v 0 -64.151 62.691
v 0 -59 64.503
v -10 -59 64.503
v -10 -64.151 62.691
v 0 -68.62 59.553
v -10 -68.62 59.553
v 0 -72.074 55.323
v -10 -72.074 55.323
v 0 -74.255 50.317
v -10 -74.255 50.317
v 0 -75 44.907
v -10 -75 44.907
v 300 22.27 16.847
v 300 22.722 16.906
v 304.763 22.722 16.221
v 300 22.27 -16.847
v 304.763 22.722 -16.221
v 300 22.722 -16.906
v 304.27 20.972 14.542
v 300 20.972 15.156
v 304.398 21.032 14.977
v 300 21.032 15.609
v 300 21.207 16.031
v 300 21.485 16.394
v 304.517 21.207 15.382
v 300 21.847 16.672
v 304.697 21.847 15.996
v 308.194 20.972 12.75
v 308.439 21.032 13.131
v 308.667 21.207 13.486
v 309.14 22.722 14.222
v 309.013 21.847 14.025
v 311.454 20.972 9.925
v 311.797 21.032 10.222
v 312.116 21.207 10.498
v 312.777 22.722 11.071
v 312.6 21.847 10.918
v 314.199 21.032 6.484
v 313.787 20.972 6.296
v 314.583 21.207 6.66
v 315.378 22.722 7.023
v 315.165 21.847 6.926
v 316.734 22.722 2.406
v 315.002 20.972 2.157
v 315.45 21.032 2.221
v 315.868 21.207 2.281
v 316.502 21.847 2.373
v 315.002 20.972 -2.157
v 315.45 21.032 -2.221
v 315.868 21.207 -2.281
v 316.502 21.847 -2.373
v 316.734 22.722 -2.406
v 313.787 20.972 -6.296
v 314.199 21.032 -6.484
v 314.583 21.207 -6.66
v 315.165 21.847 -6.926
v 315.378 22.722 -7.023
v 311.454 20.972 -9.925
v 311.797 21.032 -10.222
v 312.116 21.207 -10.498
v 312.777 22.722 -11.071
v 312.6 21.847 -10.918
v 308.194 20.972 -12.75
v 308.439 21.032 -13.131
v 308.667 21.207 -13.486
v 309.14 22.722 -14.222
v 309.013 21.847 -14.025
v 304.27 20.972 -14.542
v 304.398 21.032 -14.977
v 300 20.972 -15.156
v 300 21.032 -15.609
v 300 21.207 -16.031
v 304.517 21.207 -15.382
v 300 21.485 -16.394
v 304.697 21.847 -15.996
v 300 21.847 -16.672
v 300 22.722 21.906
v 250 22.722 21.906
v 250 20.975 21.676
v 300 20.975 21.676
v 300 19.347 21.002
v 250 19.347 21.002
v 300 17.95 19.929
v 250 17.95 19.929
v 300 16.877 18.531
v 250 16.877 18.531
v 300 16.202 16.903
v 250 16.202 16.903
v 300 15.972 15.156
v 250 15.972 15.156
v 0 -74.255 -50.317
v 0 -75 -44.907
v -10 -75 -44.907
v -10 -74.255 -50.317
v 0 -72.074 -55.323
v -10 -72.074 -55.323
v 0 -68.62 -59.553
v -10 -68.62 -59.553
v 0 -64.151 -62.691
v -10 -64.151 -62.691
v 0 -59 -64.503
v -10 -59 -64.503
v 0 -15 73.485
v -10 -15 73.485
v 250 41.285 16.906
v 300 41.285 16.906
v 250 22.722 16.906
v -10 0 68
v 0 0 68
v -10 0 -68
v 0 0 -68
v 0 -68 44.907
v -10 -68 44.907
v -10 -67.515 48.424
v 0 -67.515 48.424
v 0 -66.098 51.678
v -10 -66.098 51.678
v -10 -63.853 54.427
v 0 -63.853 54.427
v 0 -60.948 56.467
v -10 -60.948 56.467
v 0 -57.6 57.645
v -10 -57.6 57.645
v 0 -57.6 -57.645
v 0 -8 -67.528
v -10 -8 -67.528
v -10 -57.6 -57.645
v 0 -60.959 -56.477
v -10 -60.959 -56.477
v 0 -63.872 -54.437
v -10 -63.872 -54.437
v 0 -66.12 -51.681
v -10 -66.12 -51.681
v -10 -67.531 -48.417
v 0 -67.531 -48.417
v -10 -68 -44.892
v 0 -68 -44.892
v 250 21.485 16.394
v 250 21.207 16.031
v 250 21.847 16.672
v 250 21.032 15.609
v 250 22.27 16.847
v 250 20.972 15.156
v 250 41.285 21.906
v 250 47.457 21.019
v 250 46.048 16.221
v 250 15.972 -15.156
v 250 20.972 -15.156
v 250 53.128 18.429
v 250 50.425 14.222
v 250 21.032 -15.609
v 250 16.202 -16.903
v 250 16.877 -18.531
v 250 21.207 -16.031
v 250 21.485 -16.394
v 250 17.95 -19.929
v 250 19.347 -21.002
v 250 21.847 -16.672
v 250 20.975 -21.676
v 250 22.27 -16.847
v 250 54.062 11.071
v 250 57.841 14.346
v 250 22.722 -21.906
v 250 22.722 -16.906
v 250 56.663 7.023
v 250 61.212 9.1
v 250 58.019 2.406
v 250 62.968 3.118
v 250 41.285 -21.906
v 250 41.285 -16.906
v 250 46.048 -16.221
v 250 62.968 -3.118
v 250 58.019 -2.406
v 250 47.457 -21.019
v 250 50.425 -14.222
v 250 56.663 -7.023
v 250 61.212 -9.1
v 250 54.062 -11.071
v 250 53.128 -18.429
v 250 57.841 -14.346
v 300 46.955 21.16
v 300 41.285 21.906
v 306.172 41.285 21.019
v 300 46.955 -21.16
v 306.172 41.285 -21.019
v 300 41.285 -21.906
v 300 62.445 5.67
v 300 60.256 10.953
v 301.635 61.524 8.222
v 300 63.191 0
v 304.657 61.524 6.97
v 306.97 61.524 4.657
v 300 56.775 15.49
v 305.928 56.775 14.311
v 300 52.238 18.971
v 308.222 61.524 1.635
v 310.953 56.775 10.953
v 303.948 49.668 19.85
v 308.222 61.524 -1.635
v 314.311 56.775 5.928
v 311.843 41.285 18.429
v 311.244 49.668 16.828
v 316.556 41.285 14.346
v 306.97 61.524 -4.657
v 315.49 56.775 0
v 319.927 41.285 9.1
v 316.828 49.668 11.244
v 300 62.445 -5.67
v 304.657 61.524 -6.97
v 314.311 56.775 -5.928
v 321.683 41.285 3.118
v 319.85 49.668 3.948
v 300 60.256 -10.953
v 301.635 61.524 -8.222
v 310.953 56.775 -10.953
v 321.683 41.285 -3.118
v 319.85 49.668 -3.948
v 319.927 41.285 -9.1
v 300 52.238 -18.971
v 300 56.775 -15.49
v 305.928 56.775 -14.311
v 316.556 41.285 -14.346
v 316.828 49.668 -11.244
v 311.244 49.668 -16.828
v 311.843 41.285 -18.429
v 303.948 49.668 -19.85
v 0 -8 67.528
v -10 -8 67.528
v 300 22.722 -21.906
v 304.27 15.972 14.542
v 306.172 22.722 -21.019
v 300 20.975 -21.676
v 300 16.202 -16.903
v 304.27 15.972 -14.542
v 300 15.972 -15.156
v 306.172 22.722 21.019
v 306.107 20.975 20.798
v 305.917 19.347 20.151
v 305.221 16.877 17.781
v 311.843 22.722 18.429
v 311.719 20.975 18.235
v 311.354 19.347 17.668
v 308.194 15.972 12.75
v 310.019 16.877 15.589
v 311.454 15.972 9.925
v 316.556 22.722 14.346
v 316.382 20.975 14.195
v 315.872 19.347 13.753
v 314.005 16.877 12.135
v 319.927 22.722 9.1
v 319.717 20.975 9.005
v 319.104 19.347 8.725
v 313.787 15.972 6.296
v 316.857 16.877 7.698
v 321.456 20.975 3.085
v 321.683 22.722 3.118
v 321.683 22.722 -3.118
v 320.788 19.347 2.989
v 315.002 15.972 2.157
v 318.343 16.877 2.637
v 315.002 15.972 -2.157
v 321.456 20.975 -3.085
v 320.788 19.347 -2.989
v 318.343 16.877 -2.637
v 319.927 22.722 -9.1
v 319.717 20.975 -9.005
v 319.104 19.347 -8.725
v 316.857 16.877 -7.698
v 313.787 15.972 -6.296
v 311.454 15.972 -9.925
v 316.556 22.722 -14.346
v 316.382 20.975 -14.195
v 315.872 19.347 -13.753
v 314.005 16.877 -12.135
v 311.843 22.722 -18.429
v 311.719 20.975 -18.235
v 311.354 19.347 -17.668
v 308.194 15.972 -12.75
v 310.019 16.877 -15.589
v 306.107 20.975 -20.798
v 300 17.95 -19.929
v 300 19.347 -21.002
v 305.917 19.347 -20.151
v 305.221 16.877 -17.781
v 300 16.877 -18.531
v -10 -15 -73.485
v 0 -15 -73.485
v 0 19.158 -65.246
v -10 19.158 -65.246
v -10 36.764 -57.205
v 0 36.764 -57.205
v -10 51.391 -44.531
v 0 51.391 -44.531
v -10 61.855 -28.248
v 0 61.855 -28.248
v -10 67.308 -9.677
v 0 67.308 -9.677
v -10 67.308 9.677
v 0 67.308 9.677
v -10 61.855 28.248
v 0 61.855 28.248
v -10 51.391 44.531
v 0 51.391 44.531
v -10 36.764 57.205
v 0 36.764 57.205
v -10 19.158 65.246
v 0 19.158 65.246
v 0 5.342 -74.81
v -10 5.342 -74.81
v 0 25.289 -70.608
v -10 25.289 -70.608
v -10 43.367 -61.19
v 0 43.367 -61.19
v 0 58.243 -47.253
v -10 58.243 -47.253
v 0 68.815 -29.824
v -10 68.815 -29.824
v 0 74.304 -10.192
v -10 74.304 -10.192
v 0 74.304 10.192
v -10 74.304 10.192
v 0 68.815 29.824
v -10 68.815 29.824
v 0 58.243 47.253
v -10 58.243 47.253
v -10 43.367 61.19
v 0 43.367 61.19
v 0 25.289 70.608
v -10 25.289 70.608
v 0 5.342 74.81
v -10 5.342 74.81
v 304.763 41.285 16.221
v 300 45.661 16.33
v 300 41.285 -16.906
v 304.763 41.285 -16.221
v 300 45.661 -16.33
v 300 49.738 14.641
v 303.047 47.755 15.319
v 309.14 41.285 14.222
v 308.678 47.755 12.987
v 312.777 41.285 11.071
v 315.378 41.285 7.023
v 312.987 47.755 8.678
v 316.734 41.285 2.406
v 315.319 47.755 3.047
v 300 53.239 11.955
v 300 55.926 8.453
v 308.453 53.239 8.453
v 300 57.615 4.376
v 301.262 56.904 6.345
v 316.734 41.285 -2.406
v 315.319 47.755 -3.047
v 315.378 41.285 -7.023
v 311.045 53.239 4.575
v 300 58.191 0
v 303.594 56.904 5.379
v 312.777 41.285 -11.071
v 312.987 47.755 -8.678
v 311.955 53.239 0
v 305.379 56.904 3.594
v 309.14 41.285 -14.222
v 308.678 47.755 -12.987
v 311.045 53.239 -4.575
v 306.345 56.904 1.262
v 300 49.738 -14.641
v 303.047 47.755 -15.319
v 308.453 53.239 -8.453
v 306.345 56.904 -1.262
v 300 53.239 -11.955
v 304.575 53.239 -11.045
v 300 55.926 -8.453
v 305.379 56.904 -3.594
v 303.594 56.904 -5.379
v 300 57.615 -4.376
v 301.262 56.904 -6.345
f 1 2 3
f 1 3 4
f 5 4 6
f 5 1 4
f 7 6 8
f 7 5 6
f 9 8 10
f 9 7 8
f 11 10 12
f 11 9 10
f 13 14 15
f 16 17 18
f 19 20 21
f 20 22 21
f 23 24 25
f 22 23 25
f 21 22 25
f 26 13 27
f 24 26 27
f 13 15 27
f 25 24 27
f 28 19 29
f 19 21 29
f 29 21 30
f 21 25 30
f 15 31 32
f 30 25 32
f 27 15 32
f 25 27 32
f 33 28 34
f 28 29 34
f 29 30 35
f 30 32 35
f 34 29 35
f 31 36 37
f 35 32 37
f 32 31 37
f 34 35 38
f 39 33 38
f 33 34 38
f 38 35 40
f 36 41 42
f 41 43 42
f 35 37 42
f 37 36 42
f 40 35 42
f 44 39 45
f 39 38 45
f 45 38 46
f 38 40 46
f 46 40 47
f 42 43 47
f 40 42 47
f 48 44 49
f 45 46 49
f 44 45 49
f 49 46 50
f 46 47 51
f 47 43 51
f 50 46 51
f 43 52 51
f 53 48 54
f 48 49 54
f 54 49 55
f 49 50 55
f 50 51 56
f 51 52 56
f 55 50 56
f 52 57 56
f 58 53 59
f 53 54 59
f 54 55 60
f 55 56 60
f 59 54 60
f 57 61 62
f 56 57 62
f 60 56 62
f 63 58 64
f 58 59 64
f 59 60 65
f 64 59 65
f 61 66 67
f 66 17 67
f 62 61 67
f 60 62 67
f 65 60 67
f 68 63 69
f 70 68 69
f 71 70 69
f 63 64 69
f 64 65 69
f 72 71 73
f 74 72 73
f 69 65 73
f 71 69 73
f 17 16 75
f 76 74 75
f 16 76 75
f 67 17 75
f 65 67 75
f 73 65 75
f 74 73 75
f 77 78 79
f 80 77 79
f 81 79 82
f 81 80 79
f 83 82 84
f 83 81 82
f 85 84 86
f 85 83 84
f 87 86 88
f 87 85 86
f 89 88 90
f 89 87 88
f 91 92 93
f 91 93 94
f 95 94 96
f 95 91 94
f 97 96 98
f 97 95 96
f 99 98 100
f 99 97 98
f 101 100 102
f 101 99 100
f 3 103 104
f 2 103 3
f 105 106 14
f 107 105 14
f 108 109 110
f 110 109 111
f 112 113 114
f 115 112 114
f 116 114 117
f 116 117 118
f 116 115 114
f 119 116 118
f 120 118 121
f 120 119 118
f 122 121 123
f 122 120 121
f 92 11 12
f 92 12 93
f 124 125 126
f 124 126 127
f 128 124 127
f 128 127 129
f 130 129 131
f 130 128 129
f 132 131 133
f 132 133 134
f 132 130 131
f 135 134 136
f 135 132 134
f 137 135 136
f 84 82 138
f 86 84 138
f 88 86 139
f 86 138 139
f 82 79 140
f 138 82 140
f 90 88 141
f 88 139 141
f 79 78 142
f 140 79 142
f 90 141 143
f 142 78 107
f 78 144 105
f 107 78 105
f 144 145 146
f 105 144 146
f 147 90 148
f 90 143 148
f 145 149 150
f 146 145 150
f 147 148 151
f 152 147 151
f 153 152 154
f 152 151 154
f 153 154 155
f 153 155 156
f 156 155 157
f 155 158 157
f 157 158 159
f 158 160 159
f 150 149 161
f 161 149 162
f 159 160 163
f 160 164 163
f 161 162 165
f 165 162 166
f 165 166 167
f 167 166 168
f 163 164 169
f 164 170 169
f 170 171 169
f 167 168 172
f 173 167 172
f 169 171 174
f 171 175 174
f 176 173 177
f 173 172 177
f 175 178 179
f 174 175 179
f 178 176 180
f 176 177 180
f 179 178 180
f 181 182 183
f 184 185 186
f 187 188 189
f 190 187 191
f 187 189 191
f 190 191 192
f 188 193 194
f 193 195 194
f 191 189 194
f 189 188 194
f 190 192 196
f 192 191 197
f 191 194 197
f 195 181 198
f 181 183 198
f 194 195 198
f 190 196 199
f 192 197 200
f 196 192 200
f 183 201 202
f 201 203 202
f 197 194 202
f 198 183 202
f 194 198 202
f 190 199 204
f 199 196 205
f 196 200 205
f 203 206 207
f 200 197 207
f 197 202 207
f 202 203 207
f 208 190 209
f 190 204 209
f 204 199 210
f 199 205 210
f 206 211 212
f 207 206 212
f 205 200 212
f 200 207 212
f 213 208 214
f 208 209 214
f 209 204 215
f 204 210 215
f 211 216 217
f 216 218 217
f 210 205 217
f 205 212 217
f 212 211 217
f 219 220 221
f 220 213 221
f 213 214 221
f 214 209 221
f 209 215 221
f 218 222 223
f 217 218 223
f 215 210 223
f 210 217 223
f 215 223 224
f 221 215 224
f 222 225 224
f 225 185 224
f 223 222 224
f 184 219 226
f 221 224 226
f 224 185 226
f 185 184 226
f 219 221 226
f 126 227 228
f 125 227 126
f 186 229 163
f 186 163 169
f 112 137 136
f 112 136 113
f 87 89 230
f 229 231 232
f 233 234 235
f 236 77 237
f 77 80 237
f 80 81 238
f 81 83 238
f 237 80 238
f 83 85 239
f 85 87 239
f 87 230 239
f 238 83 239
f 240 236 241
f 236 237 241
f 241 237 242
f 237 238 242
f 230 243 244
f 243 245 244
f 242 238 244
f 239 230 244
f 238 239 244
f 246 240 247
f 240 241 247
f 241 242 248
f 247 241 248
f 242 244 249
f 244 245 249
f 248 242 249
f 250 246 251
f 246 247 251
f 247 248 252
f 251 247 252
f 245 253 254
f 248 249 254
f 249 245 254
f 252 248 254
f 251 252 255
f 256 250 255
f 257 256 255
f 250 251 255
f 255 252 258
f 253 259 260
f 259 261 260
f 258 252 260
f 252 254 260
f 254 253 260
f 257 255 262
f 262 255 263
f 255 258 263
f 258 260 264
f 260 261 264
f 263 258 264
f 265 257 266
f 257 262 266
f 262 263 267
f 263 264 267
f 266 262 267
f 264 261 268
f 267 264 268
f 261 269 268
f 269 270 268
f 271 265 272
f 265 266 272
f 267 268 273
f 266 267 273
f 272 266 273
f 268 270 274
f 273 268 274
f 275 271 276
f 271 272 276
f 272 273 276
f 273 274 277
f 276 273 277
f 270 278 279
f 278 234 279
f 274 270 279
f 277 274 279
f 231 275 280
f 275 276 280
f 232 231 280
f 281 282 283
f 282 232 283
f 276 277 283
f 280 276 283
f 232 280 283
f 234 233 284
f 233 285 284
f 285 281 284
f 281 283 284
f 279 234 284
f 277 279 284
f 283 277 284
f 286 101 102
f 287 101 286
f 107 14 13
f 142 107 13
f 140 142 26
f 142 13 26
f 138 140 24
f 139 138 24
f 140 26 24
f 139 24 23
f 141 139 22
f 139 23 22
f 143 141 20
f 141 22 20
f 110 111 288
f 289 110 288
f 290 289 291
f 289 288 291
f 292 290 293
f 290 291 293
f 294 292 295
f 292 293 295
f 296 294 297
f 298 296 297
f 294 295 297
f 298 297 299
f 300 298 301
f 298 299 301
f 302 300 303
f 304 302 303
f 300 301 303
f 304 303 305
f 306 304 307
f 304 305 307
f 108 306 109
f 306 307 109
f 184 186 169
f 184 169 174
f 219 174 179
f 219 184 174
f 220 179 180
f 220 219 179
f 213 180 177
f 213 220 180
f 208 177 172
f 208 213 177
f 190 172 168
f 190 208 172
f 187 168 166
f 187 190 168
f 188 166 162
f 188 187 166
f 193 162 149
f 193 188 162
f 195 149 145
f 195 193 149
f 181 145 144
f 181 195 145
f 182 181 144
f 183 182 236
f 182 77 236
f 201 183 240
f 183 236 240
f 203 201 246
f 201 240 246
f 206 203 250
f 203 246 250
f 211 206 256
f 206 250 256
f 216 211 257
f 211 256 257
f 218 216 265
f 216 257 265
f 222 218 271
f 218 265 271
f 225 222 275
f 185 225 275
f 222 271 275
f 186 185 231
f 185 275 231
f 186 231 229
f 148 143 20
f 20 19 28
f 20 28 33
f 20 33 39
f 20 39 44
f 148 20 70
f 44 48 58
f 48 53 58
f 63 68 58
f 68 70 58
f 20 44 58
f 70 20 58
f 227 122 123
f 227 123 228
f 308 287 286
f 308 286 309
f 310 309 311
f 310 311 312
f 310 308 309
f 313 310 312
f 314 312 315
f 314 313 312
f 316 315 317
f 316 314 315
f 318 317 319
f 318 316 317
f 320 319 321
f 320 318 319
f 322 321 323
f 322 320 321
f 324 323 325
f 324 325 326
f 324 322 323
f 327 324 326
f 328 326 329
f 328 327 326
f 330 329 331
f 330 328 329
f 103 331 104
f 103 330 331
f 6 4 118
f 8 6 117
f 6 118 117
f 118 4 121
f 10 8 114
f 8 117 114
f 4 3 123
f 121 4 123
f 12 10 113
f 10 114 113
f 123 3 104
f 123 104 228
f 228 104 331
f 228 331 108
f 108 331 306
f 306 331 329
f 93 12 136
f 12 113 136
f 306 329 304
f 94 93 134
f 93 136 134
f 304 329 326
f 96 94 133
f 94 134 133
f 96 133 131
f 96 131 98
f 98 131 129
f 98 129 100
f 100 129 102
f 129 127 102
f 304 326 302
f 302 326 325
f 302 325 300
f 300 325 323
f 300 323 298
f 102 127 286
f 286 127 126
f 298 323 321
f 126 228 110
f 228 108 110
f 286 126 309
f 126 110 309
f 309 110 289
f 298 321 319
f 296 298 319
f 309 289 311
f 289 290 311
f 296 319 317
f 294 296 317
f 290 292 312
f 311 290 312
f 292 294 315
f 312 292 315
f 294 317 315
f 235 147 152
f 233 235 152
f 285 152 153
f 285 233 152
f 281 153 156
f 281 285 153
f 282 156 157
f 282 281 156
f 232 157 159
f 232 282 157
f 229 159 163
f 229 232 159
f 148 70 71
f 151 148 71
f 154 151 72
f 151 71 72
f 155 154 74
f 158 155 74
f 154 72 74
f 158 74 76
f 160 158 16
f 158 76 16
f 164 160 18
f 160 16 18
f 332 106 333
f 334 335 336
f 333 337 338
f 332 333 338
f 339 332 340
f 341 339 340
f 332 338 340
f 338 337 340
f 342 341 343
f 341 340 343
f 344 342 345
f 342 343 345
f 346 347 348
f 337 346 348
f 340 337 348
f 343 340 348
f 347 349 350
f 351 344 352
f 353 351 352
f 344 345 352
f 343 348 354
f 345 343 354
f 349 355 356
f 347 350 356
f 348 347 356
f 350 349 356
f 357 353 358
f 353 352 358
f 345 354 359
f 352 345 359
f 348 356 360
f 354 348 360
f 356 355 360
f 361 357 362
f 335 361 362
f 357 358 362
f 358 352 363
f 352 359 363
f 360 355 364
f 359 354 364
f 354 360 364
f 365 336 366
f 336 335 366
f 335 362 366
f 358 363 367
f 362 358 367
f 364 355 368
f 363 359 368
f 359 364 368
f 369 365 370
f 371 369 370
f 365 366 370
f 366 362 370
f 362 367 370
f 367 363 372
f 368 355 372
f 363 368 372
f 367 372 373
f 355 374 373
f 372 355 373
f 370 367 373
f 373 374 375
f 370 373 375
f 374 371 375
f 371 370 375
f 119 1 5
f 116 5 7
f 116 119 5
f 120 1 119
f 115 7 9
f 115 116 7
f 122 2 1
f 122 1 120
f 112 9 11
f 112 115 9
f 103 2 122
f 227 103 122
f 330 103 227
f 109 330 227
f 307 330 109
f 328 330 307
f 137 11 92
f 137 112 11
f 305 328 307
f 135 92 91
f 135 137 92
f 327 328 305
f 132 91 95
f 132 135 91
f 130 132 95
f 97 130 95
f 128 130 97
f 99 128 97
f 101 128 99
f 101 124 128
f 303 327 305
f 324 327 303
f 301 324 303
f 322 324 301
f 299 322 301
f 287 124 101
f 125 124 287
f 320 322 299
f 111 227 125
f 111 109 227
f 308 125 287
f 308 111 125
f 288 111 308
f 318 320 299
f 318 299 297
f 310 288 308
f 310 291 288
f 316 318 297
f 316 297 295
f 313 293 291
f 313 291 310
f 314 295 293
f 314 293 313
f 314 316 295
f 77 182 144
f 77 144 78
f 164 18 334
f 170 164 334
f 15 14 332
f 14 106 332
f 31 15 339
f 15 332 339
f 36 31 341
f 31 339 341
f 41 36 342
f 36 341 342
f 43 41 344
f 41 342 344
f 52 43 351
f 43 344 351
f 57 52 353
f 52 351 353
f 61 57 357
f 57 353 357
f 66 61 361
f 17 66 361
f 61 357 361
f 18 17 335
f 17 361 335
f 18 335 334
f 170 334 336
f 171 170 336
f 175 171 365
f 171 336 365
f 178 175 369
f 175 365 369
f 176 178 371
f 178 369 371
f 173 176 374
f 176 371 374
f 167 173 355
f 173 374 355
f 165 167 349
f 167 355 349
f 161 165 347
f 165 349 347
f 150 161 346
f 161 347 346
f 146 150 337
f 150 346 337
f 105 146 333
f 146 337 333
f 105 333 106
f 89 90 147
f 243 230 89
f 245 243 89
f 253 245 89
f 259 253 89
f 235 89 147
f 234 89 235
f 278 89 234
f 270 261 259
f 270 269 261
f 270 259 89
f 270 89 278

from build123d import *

# Parameters (mm, degrees)
BOSS_EXTRUDE1_DEPTH = 10
BOSS_EXTRUDE2_DEPTH = 50
REVOLVE1_ANGLE      = 180


with BuildPart() as part:
    # Sketch2 → Boss-Extrude1 (new body)
    with BuildSketch(Plane(origin=(0, 0, 0), x_dir=(0, 0, -1), z_dir=(1, 0, 0))):
        with BuildLine():
            Line((-73.484692283, -15), (-64.503229893, -59))
            ThreePointArc((-64.503229893, -59), (-57.556422592, -70.491933385), (-44.907311951, -75))
            Line((-44.907311951, -75), (44.907311951, -75))
            ThreePointArc((44.907311951, -75), (57.556422592, -70.491933385), (64.503229893, -59))
            Line((64.503229893, -59), (73.484692283, -15))
            ThreePointArc((73.484692283, -15), (0, 75), (-73.484692283, -15))
        make_face()
        with BuildLine():
            Line((-68, 0), (68, 0))
            ThreePointArc((68, 0), (0, 68), (-68, 0))
        make_face(mode=Mode.SUBTRACT)
        with BuildLine():
            Line((-67.527772065, -8), (67.527772065, -8))
            Line((67.527772065, -8), (57.644658613, -57.6))
            ThreePointArc((57.644658613, -57.6), (53.136949147, -65.091485327), (44.891808794, -68))
            Line((44.891808794, -68), (-44.907311951, -68))
            ThreePointArc((-44.907311951, -68), (-53.129233867, -65.0697567), (-57.644658614, -57.6))
            Line((-57.644658614, -57.6), (-67.527772065, -8))
        make_face(mode=Mode.SUBTRACT)
    extrude(amount=-BOSS_EXTRUDE1_DEPTH)


with BuildPart() as body_2:
    # Sketch11 → Boss-Extrude2 (new body)
    with BuildSketch(Plane(origin=(300, 0, 0), x_dir=(0, 0, -1), z_dir=(1, 0, 0))):
        with BuildLine():
            Line((-21.906217783, 41.28499573), (-21.906217783, 22.72249573))
            ThreePointArc((-21.906217783, 22.72249573), (-19.929188556, 17.949524957), (-15.156217783, 15.97249573))
            Line((-15.156217783, 15.97249573), (15.156217783, 15.97249573))
            ThreePointArc((15.156217783, 15.97249573), (19.929188556, 17.949524957), (21.906217783, 22.72249573))
            Line((21.906217783, 22.72249573), (21.906217783, 41.28499573))
            ThreePointArc((21.906217783, 41.28499573), (0, 63.191213514), (-21.906217783, 41.28499573))
        make_face()
        with BuildLine():
            Line((16.906217783, 22.72249573), (16.906217783, 41.28499573))
            ThreePointArc((16.906217783, 41.28499573), (0, 58.191213514), (-16.906217783, 41.28499573))
            Line((-16.906217783, 41.28499573), (-16.906217783, 22.72249573))
            ThreePointArc((-16.906217783, 22.72249573), (-16.393654651, 21.485058863), (-15.156217783, 20.97249573))
            Line((-15.156217783, 20.97249573), (15.156217783, 20.97249573))
            ThreePointArc((15.156217783, 20.97249573), (16.393654651, 21.485058863), (16.906217783, 22.72249573))
        make_face(mode=Mode.SUBTRACT)
    extrude(amount=-BOSS_EXTRUDE2_DEPTH)

    # Sketch12 → Revolve1 (revolve)
    with BuildSketch(Plane(origin=(300, 0, 0), x_dir=(0, 0, -1), z_dir=(1, 0, 0))):
        with BuildLine():
            Line((0, 20.97249573), (-15.156217783, 20.97249573))
            ThreePointArc((-15.156217783, 20.97249573), (-16.393654651, 21.485058863), (-16.906217783, 22.72249573))
            Line((-16.906217783, 22.72249573), (-16.906217783, 41.28499573))
            ThreePointArc((-16.906217783, 41.28499573), (-11.954501239, 53.239496969), (0, 58.191213514))
            Line((0, 58.191213514), (0, 63.191213514))
            ThreePointArc((0, 63.191213514), (-15.490035145, 56.775030875), (-21.906217783, 41.28499573))
            Line((-21.906217783, 41.28499573), (-21.906217783, 22.72249573))
            ThreePointArc((-21.906217783, 22.72249573), (-19.929188556, 17.949524957), (-15.156217783, 15.97249573))
            Line((-15.156217783, 15.97249573), (0, 15.97249573))
            Line((0, 15.97249573), (0, 20.97249573))
        make_face()
    revolve(axis=Axis((300, 58.191213514, 0), (0, 1, 0)), revolution_arc=REVOLVE1_ANGLE)


solid = Compound([part.part, body_2.part])
